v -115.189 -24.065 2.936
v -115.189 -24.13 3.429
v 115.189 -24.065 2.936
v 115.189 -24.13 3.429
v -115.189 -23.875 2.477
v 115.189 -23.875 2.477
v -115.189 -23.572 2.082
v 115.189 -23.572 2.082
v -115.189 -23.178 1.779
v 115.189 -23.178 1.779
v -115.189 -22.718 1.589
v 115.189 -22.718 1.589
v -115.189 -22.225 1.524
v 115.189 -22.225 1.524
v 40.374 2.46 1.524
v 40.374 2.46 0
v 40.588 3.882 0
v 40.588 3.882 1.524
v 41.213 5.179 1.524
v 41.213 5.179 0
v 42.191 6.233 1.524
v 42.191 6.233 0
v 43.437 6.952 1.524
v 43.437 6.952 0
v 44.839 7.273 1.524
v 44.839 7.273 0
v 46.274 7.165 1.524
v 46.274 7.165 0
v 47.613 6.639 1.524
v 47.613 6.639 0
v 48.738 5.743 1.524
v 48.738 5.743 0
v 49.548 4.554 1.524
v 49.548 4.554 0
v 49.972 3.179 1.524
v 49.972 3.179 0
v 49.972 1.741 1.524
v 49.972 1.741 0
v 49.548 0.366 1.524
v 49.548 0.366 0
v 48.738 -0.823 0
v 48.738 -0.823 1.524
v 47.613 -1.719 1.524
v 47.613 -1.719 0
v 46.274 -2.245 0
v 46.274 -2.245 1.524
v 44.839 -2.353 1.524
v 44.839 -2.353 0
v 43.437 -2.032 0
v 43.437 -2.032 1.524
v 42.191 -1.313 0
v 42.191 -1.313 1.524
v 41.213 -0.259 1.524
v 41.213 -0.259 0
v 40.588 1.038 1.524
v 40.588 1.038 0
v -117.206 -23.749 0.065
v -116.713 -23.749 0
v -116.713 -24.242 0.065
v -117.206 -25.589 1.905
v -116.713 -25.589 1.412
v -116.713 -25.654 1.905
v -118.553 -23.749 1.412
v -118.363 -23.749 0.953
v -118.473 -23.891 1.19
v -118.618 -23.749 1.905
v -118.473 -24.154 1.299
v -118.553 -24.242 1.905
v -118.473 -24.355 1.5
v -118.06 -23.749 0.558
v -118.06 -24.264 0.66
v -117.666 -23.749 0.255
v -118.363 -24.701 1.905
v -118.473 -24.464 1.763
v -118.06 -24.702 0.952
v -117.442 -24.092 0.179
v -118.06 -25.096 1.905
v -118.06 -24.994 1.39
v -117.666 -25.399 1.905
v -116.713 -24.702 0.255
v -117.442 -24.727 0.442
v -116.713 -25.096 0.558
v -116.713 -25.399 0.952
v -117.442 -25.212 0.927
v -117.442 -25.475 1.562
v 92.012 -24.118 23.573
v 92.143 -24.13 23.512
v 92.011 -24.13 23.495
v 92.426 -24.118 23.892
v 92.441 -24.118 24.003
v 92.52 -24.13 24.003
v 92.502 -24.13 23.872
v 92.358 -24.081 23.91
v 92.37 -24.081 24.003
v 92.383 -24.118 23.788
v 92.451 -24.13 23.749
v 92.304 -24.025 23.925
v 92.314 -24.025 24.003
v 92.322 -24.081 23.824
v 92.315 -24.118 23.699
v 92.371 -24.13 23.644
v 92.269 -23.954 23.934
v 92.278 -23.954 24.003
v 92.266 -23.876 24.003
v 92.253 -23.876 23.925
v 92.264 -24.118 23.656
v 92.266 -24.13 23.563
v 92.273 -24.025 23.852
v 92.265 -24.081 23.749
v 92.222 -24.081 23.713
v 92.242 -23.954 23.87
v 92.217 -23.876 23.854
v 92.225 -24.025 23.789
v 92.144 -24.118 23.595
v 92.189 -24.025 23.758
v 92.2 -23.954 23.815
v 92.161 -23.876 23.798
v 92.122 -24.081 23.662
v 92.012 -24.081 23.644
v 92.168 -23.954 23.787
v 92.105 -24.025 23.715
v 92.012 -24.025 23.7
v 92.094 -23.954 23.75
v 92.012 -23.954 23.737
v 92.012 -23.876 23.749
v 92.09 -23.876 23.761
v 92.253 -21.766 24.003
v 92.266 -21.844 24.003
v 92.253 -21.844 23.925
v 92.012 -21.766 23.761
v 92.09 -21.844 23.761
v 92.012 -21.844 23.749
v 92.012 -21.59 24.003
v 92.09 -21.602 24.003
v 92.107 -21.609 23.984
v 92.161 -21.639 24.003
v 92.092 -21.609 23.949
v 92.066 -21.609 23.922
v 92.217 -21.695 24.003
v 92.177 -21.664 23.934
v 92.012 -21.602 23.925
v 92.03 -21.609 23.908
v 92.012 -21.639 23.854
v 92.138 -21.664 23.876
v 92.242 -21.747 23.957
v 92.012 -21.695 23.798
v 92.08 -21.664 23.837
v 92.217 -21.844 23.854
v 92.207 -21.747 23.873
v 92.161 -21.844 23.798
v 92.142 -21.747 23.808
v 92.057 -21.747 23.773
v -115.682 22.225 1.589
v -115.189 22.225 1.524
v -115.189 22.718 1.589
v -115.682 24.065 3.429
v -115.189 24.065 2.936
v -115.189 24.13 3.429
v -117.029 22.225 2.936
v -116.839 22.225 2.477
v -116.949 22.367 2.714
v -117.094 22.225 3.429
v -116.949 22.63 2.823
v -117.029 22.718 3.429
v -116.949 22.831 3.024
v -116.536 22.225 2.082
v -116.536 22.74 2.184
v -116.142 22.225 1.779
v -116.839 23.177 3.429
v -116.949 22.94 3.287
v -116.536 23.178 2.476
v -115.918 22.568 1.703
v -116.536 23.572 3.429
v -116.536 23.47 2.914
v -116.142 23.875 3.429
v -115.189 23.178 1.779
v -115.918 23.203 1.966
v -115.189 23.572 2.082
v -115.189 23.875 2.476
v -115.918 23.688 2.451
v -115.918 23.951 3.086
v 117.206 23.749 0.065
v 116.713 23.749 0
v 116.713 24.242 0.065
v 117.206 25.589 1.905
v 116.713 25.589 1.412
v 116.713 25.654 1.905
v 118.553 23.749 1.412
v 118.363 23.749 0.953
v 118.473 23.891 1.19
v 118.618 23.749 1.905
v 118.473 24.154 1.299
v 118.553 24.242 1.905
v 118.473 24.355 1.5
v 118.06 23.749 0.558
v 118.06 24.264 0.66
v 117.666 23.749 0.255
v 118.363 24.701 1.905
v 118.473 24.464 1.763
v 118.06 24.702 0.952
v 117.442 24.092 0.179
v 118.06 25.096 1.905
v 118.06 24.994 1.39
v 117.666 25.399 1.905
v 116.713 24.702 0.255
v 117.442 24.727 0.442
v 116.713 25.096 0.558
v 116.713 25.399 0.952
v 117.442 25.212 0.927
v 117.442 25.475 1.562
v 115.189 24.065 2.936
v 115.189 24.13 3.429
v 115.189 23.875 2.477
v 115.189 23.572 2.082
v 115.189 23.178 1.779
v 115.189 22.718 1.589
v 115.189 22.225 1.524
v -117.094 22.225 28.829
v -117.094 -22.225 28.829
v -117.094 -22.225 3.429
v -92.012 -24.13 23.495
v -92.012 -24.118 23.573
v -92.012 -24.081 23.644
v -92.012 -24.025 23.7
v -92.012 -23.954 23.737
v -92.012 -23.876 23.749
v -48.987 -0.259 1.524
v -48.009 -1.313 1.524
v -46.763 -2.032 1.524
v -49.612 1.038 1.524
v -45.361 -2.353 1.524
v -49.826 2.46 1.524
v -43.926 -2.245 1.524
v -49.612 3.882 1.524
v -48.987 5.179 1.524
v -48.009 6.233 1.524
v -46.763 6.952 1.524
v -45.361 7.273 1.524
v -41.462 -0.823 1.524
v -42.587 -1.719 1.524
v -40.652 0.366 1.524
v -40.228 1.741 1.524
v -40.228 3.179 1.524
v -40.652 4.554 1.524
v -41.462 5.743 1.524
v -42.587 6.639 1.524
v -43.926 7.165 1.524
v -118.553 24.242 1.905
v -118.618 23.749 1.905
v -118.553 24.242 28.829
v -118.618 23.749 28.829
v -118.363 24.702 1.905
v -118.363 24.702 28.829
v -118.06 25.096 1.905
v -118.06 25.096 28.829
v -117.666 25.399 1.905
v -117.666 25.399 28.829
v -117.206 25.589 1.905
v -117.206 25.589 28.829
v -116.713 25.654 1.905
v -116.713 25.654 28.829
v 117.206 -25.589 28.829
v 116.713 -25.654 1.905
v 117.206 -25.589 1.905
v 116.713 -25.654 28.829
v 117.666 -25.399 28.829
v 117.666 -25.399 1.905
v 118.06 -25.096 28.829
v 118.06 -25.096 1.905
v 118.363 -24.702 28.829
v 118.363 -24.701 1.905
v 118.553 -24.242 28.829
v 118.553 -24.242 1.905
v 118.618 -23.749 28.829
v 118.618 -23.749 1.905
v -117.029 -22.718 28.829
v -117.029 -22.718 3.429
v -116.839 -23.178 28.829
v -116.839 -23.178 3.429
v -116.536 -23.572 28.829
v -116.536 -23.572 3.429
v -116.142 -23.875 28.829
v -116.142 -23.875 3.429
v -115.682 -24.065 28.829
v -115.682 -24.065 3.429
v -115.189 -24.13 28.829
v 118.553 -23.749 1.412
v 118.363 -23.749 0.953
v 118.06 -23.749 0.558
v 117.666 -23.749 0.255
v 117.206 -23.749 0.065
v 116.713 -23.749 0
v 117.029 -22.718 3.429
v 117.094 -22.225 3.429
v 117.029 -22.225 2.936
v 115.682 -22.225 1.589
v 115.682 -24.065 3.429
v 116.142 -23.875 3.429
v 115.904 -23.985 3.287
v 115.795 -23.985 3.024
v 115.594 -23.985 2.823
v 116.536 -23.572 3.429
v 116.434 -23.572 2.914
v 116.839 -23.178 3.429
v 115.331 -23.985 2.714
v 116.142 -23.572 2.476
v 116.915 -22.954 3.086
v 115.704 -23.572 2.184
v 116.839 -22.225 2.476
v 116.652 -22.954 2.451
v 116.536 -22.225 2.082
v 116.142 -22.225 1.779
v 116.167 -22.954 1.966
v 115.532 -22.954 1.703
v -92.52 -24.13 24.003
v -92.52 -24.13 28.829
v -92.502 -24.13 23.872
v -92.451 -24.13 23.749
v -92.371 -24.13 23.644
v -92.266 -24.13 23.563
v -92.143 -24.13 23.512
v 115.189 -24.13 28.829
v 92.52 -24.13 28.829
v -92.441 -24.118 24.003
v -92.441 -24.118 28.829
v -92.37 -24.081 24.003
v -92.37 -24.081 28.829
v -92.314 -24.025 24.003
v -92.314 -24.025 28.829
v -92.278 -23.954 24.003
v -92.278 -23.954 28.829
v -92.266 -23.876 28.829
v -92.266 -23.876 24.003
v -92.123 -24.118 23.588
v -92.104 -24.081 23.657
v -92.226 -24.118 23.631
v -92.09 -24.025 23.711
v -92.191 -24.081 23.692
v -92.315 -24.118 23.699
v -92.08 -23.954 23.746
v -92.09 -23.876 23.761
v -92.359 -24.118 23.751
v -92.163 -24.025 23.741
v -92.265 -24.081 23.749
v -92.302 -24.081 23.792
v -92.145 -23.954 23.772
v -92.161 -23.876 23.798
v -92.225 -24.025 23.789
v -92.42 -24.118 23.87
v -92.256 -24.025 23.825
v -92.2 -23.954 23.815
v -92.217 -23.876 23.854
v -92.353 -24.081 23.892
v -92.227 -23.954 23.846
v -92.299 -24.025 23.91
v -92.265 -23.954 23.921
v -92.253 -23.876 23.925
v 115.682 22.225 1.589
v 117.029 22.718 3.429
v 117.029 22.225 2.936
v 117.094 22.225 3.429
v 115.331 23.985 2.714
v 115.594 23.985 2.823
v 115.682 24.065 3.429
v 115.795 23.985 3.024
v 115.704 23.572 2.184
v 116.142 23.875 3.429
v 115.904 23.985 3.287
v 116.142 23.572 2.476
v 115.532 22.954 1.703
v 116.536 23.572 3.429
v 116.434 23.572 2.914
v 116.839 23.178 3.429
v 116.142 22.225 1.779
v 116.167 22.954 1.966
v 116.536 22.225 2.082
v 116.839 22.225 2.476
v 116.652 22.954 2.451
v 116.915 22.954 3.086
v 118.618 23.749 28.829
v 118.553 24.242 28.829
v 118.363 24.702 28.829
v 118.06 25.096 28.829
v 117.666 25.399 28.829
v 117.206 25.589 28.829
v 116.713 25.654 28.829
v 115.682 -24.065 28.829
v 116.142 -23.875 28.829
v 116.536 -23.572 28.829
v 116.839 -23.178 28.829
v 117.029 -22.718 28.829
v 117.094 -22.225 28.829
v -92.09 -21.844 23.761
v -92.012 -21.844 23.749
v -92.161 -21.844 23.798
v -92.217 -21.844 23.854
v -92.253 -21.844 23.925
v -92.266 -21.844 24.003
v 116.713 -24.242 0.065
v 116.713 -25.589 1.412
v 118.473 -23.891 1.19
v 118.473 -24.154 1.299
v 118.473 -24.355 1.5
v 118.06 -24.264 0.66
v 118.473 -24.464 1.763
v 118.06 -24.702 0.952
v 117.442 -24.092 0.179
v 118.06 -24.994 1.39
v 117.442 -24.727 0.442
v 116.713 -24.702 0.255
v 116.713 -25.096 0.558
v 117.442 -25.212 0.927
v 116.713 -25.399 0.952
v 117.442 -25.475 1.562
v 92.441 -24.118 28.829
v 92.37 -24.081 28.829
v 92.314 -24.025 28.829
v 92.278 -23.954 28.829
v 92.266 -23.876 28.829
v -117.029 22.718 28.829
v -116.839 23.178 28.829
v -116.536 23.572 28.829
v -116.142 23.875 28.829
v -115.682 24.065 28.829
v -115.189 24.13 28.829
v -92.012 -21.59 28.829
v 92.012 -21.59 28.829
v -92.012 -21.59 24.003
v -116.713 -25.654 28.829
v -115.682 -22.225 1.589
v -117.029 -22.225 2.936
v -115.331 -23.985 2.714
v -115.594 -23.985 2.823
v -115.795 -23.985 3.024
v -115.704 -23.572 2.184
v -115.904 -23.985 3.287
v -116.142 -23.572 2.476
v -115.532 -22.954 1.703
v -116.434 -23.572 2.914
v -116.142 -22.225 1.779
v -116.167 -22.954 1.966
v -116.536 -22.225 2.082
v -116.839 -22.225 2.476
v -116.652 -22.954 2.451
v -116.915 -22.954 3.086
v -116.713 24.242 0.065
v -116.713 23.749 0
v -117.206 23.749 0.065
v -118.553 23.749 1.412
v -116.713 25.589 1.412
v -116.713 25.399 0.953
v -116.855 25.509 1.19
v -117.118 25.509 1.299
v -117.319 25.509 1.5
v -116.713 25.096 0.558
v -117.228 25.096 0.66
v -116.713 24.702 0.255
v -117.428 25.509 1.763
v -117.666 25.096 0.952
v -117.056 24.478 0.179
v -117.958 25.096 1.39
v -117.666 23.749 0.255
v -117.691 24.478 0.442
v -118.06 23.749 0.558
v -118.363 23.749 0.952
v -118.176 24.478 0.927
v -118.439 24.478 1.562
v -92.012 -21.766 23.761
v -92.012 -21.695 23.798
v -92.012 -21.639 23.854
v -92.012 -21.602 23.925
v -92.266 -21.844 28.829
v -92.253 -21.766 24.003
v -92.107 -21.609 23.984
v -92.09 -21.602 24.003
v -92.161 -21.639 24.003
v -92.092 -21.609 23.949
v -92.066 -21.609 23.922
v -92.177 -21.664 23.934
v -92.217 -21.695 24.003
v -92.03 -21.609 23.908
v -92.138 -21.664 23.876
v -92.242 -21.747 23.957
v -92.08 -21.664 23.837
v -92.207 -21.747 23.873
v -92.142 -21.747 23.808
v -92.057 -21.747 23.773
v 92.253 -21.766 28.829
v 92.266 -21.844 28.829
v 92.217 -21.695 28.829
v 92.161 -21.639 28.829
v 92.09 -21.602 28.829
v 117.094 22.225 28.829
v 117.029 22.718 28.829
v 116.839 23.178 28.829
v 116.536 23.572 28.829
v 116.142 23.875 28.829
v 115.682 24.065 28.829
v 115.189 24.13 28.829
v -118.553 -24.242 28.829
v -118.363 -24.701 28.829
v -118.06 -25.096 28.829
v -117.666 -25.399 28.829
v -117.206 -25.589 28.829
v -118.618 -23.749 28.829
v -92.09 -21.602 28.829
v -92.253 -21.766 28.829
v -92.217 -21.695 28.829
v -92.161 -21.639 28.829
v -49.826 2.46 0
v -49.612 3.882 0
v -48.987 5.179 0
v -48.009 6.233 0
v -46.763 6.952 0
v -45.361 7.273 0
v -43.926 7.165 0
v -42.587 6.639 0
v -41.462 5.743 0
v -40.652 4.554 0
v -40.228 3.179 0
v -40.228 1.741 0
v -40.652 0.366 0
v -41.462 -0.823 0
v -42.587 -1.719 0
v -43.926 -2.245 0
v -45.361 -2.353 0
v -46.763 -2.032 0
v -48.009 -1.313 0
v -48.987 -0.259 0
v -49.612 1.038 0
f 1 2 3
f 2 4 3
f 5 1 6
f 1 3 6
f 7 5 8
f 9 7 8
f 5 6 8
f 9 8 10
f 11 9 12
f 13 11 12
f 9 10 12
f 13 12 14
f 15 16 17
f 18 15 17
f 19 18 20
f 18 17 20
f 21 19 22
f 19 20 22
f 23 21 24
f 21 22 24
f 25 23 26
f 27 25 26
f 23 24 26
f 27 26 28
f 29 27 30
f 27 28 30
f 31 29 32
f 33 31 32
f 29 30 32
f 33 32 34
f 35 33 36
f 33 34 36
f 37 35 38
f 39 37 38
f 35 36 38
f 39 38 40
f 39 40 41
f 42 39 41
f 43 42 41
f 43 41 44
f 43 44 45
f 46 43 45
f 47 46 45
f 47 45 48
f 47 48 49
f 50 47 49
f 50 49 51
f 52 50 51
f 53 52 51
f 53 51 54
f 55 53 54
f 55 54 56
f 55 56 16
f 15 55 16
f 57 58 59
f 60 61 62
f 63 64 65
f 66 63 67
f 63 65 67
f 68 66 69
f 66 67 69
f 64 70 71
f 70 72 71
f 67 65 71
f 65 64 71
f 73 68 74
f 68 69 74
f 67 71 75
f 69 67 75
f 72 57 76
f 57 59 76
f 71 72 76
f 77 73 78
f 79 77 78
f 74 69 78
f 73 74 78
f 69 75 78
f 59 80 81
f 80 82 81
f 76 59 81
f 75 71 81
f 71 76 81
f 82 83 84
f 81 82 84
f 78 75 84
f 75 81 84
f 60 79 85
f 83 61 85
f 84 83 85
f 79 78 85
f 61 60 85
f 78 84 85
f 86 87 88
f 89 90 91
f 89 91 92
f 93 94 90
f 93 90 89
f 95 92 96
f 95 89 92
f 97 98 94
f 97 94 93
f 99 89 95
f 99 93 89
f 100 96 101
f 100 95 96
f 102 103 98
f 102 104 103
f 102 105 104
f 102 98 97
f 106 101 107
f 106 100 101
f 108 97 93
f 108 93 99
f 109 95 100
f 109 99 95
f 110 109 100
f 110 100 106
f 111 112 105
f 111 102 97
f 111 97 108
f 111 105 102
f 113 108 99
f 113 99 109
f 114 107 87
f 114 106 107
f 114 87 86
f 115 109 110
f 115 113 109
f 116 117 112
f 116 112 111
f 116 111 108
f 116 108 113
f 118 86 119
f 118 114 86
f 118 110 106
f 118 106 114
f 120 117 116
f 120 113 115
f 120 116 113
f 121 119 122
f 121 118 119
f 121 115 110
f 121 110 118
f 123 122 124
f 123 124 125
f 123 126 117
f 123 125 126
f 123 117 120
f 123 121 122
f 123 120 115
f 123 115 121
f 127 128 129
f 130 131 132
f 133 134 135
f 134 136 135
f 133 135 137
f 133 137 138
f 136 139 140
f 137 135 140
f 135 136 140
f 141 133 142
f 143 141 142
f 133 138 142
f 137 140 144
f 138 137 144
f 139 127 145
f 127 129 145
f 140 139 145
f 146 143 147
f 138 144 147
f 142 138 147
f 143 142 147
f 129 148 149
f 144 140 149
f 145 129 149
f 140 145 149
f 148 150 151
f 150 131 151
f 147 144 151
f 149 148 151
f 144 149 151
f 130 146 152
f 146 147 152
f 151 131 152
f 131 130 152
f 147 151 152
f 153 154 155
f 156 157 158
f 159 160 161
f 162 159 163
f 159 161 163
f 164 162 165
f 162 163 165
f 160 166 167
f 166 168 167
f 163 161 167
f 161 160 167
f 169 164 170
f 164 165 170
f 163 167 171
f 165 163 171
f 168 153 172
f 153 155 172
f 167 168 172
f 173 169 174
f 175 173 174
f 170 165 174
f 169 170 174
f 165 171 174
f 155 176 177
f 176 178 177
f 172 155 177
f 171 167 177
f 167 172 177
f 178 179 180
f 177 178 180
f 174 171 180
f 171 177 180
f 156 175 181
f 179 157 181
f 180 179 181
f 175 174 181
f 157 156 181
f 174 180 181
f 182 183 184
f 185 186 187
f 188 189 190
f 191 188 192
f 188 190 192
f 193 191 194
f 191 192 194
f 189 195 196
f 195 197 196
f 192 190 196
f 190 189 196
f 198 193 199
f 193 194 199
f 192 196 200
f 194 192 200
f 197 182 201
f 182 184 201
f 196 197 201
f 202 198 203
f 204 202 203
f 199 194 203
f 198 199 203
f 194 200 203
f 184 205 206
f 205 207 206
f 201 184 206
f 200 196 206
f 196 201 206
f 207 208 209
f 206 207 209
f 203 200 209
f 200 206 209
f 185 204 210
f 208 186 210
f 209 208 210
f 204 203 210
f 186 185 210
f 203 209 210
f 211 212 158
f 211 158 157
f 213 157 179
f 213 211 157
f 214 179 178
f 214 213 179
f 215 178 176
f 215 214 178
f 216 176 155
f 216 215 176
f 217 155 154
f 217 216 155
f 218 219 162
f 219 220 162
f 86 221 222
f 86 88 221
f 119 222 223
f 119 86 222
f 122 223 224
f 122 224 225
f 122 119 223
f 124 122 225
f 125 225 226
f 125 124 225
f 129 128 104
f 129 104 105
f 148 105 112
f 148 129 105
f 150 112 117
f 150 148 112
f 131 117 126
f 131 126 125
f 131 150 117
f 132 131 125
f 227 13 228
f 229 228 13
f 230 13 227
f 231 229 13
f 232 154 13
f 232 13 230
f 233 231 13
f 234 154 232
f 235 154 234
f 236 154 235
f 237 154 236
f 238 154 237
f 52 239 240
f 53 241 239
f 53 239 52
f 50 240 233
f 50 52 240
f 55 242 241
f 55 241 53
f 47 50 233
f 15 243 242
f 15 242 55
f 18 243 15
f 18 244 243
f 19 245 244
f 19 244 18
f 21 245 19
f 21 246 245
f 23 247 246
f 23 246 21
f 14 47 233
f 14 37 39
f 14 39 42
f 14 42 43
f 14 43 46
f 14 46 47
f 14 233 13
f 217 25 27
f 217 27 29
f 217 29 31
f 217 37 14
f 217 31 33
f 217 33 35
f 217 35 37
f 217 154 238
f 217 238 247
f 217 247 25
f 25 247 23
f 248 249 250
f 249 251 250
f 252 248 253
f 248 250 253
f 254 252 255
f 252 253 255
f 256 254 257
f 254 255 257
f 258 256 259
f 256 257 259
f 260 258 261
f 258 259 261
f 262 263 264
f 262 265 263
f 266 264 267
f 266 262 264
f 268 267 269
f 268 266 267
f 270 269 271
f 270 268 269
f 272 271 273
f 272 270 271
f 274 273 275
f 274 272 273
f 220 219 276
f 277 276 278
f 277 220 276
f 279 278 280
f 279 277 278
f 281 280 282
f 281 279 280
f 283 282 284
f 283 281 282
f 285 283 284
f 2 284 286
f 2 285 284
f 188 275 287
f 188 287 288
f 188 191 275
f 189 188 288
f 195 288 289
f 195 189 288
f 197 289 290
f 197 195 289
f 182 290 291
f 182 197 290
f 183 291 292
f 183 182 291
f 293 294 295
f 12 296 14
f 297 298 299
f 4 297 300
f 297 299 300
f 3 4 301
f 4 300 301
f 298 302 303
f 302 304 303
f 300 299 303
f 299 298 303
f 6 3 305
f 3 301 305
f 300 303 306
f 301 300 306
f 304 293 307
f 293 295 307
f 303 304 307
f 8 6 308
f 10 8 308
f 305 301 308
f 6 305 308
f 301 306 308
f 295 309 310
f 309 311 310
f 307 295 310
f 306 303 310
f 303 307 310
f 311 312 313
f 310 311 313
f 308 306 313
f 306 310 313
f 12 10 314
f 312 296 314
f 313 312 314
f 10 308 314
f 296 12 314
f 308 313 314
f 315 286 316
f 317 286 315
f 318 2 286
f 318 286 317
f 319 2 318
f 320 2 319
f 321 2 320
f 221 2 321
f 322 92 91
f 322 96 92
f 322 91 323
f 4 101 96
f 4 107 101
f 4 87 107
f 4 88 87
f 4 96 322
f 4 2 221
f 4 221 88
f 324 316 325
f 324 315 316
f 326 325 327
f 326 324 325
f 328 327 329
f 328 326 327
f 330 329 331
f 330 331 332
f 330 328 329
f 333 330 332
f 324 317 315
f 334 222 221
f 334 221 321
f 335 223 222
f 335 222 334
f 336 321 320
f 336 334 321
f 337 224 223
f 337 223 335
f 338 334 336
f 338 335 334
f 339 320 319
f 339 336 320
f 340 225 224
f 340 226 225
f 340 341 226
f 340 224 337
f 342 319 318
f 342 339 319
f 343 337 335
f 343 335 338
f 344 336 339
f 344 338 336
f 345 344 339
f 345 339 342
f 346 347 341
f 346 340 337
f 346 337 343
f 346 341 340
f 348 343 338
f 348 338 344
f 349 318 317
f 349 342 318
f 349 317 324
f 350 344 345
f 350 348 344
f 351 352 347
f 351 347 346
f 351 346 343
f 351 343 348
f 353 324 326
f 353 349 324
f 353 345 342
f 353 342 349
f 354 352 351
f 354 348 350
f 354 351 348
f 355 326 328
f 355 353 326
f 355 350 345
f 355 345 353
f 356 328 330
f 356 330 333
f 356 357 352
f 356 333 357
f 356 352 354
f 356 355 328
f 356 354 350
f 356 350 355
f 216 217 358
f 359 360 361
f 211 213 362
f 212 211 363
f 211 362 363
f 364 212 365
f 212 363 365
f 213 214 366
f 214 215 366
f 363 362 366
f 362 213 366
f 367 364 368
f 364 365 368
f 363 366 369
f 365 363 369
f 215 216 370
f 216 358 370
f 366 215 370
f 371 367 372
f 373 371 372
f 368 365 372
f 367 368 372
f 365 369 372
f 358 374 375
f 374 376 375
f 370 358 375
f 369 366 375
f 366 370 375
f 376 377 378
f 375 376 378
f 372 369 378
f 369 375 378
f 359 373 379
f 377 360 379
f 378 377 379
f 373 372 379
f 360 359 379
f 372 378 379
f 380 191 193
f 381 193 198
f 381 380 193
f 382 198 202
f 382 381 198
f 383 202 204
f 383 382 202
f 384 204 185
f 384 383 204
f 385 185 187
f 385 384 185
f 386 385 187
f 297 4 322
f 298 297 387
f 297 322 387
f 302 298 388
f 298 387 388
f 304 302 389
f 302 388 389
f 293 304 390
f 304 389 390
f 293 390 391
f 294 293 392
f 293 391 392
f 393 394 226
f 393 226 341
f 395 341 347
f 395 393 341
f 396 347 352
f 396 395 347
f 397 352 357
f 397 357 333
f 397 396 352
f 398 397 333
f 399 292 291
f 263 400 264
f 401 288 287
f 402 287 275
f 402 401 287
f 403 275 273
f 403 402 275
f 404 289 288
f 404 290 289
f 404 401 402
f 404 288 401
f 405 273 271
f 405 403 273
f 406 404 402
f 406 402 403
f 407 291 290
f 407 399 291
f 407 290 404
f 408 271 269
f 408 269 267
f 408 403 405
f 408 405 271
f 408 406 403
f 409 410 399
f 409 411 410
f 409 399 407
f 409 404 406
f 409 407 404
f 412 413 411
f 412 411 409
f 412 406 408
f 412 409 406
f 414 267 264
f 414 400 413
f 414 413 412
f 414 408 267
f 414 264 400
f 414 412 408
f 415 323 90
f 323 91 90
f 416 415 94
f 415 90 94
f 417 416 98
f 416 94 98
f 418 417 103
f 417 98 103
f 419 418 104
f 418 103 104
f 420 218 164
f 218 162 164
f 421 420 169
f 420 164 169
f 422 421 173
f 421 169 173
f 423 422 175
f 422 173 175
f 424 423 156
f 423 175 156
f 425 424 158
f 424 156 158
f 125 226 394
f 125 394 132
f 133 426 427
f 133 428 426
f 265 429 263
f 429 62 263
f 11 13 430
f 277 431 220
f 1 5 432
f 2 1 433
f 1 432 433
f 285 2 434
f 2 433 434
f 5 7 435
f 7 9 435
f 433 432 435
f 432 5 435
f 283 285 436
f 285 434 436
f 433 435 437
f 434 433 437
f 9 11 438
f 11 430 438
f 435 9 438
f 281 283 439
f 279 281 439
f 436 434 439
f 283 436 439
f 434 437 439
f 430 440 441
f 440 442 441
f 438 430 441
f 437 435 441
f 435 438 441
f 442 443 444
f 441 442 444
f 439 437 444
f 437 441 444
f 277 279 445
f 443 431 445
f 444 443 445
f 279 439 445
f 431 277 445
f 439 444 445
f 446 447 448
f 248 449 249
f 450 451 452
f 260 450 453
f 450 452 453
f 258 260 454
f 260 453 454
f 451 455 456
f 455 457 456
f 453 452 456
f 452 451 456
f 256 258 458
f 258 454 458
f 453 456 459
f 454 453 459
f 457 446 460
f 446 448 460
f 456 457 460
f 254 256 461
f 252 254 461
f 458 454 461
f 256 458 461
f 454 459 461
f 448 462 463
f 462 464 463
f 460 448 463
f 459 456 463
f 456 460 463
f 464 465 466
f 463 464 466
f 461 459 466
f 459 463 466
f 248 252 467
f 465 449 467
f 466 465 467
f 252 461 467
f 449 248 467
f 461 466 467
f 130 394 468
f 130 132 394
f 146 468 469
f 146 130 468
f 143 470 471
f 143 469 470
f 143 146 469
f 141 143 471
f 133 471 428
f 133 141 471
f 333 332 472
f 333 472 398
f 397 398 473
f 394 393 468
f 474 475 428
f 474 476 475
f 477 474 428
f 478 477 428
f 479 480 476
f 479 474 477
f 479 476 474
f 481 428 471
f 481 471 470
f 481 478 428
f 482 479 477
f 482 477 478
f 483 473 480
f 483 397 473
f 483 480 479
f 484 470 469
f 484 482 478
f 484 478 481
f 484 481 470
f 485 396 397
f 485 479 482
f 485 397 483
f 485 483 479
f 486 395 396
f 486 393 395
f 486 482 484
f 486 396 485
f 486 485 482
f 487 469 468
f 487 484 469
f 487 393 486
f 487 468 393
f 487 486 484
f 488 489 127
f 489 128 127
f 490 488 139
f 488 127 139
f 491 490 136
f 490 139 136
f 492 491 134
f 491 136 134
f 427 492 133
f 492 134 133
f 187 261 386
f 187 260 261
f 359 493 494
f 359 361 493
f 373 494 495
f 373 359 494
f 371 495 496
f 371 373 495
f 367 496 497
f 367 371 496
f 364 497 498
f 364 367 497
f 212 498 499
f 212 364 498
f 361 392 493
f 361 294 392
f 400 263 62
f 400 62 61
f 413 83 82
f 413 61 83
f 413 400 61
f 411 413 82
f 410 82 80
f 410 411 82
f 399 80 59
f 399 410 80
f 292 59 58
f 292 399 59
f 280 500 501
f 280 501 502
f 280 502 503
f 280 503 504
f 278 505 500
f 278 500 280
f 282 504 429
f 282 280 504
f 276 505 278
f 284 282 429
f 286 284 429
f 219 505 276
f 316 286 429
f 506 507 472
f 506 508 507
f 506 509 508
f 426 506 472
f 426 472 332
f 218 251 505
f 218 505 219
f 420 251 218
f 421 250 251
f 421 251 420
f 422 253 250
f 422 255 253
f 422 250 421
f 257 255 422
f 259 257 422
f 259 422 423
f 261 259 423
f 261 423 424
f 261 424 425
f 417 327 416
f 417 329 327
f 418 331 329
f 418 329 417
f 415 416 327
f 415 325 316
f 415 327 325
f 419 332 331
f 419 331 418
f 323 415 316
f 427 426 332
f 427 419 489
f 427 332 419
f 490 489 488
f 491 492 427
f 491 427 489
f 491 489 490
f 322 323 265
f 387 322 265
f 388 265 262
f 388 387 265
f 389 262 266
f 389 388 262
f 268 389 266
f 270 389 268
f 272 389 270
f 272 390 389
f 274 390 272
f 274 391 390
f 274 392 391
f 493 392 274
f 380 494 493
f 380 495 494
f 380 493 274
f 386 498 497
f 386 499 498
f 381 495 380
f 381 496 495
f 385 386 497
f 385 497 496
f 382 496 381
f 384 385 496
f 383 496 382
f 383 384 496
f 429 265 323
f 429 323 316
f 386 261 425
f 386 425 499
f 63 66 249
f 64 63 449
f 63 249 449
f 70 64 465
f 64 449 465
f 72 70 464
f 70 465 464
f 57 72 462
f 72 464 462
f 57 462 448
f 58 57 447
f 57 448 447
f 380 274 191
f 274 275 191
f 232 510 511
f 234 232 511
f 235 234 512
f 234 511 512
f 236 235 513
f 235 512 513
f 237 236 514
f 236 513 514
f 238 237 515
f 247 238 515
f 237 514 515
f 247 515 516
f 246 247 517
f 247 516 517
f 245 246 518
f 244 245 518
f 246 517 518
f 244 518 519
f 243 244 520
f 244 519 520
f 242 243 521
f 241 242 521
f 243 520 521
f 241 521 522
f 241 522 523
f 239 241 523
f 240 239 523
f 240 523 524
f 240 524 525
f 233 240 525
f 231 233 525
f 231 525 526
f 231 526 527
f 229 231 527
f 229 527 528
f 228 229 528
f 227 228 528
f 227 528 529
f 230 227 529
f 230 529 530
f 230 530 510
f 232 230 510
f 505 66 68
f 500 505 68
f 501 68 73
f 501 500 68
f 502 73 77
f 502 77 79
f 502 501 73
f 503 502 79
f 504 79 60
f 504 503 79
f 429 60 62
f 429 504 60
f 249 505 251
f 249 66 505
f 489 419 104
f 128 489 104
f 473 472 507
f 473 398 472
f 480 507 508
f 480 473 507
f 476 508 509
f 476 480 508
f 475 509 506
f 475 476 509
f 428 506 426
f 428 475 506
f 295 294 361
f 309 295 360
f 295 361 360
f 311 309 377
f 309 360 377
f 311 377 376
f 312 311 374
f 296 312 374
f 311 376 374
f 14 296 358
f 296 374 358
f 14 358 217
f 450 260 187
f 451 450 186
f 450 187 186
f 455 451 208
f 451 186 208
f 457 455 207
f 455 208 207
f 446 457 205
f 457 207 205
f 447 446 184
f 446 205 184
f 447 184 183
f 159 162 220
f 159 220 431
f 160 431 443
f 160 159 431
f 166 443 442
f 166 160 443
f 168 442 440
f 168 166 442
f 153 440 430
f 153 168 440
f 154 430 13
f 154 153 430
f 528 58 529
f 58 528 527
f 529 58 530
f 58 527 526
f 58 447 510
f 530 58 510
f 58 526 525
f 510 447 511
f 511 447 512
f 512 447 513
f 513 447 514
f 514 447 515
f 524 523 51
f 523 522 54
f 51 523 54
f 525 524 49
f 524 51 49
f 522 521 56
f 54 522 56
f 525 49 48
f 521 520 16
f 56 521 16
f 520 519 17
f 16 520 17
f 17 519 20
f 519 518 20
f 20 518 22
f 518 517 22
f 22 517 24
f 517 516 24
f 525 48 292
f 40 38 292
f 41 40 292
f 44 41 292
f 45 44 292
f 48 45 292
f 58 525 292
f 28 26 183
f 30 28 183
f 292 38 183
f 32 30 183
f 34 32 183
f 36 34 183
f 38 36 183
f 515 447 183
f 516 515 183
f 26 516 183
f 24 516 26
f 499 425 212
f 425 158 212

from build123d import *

# Parameters (mm, degrees)
SKETCH1_W           = 237.236
SKETCH1_H           = 51.308
BOSS_EXTRUDE1_DEPTH = 28.829
SHELL1_T            = -1.524
FILLET1_R           = 1.905
FILLET2_R           = 1.905
SKETCH2_R           = 4.826
CUT_EXTRUDE1_DEPTH  = 2.54
SKETCH3_W           = 184.531
SKETCH3_H           = 5.08
BOSS_EXTRUDE2_DEPTH = 2.54
FILLET3_R           = 0.254


with BuildPart() as part:
    # Sketch1 → Boss-Extrude1 (new body)
    with BuildSketch(Plane.XY):
        Rectangle(SKETCH1_W, SKETCH1_H)
    extrude(amount=BOSS_EXTRUDE1_DEPTH)

    # Shell1
    shell1_openings = [part.faces().sort_by_distance(p)[0] for p in [
        (0, 0, 28.829),
    ]]
    offset(amount=SHELL1_T, openings=shell1_openings, kind=Kind.INTERSECTION)

    # Fillet1
    fillet1_edges = [part.edges().sort_by_distance(p)[0] for p in [
        (117.094, 0, 1.524),
        (117.094, -24.13, 15.1765),
        (0, 24.13, 1.524),
        (117.094, 24.13, 15.1765),
        (-117.094, 0, 1.524),
        (-117.094, 24.13, 15.1765),
        (0, -24.13, 1.524),
        (-117.094, -24.13, 15.1765),
    ]]
    fillet(fillet1_edges, radius=FILLET1_R)

    # Fillet2
    fillet2_edges = [part.edges().sort_by_distance(p)[0] for p in [
        (0, -25.654, 0),
        (-118.618, 0, 0),
        (0, 25.654, 0),
        (118.618, 0, 0),
        (118.618, -25.654, 14.4145),
        (-118.618, -25.654, 14.4145),
        (-118.618, 25.654, 14.4145),
        (118.618, 25.654, 14.4145),
    ]]
    fillet(fillet2_edges, radius=FILLET2_R)

    # Sketch2 → Cut-Extrude1 (cut)
    with BuildSketch(Plane(origin=(0, 0, 0), x_dir=(-1, 0, 0), z_dir=(0, 0, -1))):
        with Locations((-45.2, 2.46)):
            Circle(SKETCH2_R)
        with Locations((45, 2.46)):
            Circle(SKETCH2_R)
    extrude(amount=-CUT_EXTRUDE1_DEPTH, mode=Mode.SUBTRACT)

    # Sketch3 → Boss-Extrude2 (add)
    with BuildSketch(Plane(origin=(0, -24.13, 0), x_dir=(1, 0, 0), z_dir=(0, 1, 0))):
        with Locations((0, -26.289)):
            Rectangle(SKETCH3_W, SKETCH3_H)
    extrude(amount=BOSS_EXTRUDE2_DEPTH)

    # Fillet3
    fillet3_edges = [part.edges().sort_by_distance(p)[0] for p in [
        (-92.2655, -24.13, 26.289),
        (-92.2655, -22.86, 23.749),
        (92.2655, -24.13, 26.289),
        (0, -24.13, 23.749),
        (92.2655, -22.86, 23.749),
        (-92.2655, -21.59, 26.289),
        (92.2655, -21.59, 26.289),
        (0, -21.59, 23.749),
    ]]
    fillet(fillet3_edges, radius=FILLET3_R)


solid = part.part
